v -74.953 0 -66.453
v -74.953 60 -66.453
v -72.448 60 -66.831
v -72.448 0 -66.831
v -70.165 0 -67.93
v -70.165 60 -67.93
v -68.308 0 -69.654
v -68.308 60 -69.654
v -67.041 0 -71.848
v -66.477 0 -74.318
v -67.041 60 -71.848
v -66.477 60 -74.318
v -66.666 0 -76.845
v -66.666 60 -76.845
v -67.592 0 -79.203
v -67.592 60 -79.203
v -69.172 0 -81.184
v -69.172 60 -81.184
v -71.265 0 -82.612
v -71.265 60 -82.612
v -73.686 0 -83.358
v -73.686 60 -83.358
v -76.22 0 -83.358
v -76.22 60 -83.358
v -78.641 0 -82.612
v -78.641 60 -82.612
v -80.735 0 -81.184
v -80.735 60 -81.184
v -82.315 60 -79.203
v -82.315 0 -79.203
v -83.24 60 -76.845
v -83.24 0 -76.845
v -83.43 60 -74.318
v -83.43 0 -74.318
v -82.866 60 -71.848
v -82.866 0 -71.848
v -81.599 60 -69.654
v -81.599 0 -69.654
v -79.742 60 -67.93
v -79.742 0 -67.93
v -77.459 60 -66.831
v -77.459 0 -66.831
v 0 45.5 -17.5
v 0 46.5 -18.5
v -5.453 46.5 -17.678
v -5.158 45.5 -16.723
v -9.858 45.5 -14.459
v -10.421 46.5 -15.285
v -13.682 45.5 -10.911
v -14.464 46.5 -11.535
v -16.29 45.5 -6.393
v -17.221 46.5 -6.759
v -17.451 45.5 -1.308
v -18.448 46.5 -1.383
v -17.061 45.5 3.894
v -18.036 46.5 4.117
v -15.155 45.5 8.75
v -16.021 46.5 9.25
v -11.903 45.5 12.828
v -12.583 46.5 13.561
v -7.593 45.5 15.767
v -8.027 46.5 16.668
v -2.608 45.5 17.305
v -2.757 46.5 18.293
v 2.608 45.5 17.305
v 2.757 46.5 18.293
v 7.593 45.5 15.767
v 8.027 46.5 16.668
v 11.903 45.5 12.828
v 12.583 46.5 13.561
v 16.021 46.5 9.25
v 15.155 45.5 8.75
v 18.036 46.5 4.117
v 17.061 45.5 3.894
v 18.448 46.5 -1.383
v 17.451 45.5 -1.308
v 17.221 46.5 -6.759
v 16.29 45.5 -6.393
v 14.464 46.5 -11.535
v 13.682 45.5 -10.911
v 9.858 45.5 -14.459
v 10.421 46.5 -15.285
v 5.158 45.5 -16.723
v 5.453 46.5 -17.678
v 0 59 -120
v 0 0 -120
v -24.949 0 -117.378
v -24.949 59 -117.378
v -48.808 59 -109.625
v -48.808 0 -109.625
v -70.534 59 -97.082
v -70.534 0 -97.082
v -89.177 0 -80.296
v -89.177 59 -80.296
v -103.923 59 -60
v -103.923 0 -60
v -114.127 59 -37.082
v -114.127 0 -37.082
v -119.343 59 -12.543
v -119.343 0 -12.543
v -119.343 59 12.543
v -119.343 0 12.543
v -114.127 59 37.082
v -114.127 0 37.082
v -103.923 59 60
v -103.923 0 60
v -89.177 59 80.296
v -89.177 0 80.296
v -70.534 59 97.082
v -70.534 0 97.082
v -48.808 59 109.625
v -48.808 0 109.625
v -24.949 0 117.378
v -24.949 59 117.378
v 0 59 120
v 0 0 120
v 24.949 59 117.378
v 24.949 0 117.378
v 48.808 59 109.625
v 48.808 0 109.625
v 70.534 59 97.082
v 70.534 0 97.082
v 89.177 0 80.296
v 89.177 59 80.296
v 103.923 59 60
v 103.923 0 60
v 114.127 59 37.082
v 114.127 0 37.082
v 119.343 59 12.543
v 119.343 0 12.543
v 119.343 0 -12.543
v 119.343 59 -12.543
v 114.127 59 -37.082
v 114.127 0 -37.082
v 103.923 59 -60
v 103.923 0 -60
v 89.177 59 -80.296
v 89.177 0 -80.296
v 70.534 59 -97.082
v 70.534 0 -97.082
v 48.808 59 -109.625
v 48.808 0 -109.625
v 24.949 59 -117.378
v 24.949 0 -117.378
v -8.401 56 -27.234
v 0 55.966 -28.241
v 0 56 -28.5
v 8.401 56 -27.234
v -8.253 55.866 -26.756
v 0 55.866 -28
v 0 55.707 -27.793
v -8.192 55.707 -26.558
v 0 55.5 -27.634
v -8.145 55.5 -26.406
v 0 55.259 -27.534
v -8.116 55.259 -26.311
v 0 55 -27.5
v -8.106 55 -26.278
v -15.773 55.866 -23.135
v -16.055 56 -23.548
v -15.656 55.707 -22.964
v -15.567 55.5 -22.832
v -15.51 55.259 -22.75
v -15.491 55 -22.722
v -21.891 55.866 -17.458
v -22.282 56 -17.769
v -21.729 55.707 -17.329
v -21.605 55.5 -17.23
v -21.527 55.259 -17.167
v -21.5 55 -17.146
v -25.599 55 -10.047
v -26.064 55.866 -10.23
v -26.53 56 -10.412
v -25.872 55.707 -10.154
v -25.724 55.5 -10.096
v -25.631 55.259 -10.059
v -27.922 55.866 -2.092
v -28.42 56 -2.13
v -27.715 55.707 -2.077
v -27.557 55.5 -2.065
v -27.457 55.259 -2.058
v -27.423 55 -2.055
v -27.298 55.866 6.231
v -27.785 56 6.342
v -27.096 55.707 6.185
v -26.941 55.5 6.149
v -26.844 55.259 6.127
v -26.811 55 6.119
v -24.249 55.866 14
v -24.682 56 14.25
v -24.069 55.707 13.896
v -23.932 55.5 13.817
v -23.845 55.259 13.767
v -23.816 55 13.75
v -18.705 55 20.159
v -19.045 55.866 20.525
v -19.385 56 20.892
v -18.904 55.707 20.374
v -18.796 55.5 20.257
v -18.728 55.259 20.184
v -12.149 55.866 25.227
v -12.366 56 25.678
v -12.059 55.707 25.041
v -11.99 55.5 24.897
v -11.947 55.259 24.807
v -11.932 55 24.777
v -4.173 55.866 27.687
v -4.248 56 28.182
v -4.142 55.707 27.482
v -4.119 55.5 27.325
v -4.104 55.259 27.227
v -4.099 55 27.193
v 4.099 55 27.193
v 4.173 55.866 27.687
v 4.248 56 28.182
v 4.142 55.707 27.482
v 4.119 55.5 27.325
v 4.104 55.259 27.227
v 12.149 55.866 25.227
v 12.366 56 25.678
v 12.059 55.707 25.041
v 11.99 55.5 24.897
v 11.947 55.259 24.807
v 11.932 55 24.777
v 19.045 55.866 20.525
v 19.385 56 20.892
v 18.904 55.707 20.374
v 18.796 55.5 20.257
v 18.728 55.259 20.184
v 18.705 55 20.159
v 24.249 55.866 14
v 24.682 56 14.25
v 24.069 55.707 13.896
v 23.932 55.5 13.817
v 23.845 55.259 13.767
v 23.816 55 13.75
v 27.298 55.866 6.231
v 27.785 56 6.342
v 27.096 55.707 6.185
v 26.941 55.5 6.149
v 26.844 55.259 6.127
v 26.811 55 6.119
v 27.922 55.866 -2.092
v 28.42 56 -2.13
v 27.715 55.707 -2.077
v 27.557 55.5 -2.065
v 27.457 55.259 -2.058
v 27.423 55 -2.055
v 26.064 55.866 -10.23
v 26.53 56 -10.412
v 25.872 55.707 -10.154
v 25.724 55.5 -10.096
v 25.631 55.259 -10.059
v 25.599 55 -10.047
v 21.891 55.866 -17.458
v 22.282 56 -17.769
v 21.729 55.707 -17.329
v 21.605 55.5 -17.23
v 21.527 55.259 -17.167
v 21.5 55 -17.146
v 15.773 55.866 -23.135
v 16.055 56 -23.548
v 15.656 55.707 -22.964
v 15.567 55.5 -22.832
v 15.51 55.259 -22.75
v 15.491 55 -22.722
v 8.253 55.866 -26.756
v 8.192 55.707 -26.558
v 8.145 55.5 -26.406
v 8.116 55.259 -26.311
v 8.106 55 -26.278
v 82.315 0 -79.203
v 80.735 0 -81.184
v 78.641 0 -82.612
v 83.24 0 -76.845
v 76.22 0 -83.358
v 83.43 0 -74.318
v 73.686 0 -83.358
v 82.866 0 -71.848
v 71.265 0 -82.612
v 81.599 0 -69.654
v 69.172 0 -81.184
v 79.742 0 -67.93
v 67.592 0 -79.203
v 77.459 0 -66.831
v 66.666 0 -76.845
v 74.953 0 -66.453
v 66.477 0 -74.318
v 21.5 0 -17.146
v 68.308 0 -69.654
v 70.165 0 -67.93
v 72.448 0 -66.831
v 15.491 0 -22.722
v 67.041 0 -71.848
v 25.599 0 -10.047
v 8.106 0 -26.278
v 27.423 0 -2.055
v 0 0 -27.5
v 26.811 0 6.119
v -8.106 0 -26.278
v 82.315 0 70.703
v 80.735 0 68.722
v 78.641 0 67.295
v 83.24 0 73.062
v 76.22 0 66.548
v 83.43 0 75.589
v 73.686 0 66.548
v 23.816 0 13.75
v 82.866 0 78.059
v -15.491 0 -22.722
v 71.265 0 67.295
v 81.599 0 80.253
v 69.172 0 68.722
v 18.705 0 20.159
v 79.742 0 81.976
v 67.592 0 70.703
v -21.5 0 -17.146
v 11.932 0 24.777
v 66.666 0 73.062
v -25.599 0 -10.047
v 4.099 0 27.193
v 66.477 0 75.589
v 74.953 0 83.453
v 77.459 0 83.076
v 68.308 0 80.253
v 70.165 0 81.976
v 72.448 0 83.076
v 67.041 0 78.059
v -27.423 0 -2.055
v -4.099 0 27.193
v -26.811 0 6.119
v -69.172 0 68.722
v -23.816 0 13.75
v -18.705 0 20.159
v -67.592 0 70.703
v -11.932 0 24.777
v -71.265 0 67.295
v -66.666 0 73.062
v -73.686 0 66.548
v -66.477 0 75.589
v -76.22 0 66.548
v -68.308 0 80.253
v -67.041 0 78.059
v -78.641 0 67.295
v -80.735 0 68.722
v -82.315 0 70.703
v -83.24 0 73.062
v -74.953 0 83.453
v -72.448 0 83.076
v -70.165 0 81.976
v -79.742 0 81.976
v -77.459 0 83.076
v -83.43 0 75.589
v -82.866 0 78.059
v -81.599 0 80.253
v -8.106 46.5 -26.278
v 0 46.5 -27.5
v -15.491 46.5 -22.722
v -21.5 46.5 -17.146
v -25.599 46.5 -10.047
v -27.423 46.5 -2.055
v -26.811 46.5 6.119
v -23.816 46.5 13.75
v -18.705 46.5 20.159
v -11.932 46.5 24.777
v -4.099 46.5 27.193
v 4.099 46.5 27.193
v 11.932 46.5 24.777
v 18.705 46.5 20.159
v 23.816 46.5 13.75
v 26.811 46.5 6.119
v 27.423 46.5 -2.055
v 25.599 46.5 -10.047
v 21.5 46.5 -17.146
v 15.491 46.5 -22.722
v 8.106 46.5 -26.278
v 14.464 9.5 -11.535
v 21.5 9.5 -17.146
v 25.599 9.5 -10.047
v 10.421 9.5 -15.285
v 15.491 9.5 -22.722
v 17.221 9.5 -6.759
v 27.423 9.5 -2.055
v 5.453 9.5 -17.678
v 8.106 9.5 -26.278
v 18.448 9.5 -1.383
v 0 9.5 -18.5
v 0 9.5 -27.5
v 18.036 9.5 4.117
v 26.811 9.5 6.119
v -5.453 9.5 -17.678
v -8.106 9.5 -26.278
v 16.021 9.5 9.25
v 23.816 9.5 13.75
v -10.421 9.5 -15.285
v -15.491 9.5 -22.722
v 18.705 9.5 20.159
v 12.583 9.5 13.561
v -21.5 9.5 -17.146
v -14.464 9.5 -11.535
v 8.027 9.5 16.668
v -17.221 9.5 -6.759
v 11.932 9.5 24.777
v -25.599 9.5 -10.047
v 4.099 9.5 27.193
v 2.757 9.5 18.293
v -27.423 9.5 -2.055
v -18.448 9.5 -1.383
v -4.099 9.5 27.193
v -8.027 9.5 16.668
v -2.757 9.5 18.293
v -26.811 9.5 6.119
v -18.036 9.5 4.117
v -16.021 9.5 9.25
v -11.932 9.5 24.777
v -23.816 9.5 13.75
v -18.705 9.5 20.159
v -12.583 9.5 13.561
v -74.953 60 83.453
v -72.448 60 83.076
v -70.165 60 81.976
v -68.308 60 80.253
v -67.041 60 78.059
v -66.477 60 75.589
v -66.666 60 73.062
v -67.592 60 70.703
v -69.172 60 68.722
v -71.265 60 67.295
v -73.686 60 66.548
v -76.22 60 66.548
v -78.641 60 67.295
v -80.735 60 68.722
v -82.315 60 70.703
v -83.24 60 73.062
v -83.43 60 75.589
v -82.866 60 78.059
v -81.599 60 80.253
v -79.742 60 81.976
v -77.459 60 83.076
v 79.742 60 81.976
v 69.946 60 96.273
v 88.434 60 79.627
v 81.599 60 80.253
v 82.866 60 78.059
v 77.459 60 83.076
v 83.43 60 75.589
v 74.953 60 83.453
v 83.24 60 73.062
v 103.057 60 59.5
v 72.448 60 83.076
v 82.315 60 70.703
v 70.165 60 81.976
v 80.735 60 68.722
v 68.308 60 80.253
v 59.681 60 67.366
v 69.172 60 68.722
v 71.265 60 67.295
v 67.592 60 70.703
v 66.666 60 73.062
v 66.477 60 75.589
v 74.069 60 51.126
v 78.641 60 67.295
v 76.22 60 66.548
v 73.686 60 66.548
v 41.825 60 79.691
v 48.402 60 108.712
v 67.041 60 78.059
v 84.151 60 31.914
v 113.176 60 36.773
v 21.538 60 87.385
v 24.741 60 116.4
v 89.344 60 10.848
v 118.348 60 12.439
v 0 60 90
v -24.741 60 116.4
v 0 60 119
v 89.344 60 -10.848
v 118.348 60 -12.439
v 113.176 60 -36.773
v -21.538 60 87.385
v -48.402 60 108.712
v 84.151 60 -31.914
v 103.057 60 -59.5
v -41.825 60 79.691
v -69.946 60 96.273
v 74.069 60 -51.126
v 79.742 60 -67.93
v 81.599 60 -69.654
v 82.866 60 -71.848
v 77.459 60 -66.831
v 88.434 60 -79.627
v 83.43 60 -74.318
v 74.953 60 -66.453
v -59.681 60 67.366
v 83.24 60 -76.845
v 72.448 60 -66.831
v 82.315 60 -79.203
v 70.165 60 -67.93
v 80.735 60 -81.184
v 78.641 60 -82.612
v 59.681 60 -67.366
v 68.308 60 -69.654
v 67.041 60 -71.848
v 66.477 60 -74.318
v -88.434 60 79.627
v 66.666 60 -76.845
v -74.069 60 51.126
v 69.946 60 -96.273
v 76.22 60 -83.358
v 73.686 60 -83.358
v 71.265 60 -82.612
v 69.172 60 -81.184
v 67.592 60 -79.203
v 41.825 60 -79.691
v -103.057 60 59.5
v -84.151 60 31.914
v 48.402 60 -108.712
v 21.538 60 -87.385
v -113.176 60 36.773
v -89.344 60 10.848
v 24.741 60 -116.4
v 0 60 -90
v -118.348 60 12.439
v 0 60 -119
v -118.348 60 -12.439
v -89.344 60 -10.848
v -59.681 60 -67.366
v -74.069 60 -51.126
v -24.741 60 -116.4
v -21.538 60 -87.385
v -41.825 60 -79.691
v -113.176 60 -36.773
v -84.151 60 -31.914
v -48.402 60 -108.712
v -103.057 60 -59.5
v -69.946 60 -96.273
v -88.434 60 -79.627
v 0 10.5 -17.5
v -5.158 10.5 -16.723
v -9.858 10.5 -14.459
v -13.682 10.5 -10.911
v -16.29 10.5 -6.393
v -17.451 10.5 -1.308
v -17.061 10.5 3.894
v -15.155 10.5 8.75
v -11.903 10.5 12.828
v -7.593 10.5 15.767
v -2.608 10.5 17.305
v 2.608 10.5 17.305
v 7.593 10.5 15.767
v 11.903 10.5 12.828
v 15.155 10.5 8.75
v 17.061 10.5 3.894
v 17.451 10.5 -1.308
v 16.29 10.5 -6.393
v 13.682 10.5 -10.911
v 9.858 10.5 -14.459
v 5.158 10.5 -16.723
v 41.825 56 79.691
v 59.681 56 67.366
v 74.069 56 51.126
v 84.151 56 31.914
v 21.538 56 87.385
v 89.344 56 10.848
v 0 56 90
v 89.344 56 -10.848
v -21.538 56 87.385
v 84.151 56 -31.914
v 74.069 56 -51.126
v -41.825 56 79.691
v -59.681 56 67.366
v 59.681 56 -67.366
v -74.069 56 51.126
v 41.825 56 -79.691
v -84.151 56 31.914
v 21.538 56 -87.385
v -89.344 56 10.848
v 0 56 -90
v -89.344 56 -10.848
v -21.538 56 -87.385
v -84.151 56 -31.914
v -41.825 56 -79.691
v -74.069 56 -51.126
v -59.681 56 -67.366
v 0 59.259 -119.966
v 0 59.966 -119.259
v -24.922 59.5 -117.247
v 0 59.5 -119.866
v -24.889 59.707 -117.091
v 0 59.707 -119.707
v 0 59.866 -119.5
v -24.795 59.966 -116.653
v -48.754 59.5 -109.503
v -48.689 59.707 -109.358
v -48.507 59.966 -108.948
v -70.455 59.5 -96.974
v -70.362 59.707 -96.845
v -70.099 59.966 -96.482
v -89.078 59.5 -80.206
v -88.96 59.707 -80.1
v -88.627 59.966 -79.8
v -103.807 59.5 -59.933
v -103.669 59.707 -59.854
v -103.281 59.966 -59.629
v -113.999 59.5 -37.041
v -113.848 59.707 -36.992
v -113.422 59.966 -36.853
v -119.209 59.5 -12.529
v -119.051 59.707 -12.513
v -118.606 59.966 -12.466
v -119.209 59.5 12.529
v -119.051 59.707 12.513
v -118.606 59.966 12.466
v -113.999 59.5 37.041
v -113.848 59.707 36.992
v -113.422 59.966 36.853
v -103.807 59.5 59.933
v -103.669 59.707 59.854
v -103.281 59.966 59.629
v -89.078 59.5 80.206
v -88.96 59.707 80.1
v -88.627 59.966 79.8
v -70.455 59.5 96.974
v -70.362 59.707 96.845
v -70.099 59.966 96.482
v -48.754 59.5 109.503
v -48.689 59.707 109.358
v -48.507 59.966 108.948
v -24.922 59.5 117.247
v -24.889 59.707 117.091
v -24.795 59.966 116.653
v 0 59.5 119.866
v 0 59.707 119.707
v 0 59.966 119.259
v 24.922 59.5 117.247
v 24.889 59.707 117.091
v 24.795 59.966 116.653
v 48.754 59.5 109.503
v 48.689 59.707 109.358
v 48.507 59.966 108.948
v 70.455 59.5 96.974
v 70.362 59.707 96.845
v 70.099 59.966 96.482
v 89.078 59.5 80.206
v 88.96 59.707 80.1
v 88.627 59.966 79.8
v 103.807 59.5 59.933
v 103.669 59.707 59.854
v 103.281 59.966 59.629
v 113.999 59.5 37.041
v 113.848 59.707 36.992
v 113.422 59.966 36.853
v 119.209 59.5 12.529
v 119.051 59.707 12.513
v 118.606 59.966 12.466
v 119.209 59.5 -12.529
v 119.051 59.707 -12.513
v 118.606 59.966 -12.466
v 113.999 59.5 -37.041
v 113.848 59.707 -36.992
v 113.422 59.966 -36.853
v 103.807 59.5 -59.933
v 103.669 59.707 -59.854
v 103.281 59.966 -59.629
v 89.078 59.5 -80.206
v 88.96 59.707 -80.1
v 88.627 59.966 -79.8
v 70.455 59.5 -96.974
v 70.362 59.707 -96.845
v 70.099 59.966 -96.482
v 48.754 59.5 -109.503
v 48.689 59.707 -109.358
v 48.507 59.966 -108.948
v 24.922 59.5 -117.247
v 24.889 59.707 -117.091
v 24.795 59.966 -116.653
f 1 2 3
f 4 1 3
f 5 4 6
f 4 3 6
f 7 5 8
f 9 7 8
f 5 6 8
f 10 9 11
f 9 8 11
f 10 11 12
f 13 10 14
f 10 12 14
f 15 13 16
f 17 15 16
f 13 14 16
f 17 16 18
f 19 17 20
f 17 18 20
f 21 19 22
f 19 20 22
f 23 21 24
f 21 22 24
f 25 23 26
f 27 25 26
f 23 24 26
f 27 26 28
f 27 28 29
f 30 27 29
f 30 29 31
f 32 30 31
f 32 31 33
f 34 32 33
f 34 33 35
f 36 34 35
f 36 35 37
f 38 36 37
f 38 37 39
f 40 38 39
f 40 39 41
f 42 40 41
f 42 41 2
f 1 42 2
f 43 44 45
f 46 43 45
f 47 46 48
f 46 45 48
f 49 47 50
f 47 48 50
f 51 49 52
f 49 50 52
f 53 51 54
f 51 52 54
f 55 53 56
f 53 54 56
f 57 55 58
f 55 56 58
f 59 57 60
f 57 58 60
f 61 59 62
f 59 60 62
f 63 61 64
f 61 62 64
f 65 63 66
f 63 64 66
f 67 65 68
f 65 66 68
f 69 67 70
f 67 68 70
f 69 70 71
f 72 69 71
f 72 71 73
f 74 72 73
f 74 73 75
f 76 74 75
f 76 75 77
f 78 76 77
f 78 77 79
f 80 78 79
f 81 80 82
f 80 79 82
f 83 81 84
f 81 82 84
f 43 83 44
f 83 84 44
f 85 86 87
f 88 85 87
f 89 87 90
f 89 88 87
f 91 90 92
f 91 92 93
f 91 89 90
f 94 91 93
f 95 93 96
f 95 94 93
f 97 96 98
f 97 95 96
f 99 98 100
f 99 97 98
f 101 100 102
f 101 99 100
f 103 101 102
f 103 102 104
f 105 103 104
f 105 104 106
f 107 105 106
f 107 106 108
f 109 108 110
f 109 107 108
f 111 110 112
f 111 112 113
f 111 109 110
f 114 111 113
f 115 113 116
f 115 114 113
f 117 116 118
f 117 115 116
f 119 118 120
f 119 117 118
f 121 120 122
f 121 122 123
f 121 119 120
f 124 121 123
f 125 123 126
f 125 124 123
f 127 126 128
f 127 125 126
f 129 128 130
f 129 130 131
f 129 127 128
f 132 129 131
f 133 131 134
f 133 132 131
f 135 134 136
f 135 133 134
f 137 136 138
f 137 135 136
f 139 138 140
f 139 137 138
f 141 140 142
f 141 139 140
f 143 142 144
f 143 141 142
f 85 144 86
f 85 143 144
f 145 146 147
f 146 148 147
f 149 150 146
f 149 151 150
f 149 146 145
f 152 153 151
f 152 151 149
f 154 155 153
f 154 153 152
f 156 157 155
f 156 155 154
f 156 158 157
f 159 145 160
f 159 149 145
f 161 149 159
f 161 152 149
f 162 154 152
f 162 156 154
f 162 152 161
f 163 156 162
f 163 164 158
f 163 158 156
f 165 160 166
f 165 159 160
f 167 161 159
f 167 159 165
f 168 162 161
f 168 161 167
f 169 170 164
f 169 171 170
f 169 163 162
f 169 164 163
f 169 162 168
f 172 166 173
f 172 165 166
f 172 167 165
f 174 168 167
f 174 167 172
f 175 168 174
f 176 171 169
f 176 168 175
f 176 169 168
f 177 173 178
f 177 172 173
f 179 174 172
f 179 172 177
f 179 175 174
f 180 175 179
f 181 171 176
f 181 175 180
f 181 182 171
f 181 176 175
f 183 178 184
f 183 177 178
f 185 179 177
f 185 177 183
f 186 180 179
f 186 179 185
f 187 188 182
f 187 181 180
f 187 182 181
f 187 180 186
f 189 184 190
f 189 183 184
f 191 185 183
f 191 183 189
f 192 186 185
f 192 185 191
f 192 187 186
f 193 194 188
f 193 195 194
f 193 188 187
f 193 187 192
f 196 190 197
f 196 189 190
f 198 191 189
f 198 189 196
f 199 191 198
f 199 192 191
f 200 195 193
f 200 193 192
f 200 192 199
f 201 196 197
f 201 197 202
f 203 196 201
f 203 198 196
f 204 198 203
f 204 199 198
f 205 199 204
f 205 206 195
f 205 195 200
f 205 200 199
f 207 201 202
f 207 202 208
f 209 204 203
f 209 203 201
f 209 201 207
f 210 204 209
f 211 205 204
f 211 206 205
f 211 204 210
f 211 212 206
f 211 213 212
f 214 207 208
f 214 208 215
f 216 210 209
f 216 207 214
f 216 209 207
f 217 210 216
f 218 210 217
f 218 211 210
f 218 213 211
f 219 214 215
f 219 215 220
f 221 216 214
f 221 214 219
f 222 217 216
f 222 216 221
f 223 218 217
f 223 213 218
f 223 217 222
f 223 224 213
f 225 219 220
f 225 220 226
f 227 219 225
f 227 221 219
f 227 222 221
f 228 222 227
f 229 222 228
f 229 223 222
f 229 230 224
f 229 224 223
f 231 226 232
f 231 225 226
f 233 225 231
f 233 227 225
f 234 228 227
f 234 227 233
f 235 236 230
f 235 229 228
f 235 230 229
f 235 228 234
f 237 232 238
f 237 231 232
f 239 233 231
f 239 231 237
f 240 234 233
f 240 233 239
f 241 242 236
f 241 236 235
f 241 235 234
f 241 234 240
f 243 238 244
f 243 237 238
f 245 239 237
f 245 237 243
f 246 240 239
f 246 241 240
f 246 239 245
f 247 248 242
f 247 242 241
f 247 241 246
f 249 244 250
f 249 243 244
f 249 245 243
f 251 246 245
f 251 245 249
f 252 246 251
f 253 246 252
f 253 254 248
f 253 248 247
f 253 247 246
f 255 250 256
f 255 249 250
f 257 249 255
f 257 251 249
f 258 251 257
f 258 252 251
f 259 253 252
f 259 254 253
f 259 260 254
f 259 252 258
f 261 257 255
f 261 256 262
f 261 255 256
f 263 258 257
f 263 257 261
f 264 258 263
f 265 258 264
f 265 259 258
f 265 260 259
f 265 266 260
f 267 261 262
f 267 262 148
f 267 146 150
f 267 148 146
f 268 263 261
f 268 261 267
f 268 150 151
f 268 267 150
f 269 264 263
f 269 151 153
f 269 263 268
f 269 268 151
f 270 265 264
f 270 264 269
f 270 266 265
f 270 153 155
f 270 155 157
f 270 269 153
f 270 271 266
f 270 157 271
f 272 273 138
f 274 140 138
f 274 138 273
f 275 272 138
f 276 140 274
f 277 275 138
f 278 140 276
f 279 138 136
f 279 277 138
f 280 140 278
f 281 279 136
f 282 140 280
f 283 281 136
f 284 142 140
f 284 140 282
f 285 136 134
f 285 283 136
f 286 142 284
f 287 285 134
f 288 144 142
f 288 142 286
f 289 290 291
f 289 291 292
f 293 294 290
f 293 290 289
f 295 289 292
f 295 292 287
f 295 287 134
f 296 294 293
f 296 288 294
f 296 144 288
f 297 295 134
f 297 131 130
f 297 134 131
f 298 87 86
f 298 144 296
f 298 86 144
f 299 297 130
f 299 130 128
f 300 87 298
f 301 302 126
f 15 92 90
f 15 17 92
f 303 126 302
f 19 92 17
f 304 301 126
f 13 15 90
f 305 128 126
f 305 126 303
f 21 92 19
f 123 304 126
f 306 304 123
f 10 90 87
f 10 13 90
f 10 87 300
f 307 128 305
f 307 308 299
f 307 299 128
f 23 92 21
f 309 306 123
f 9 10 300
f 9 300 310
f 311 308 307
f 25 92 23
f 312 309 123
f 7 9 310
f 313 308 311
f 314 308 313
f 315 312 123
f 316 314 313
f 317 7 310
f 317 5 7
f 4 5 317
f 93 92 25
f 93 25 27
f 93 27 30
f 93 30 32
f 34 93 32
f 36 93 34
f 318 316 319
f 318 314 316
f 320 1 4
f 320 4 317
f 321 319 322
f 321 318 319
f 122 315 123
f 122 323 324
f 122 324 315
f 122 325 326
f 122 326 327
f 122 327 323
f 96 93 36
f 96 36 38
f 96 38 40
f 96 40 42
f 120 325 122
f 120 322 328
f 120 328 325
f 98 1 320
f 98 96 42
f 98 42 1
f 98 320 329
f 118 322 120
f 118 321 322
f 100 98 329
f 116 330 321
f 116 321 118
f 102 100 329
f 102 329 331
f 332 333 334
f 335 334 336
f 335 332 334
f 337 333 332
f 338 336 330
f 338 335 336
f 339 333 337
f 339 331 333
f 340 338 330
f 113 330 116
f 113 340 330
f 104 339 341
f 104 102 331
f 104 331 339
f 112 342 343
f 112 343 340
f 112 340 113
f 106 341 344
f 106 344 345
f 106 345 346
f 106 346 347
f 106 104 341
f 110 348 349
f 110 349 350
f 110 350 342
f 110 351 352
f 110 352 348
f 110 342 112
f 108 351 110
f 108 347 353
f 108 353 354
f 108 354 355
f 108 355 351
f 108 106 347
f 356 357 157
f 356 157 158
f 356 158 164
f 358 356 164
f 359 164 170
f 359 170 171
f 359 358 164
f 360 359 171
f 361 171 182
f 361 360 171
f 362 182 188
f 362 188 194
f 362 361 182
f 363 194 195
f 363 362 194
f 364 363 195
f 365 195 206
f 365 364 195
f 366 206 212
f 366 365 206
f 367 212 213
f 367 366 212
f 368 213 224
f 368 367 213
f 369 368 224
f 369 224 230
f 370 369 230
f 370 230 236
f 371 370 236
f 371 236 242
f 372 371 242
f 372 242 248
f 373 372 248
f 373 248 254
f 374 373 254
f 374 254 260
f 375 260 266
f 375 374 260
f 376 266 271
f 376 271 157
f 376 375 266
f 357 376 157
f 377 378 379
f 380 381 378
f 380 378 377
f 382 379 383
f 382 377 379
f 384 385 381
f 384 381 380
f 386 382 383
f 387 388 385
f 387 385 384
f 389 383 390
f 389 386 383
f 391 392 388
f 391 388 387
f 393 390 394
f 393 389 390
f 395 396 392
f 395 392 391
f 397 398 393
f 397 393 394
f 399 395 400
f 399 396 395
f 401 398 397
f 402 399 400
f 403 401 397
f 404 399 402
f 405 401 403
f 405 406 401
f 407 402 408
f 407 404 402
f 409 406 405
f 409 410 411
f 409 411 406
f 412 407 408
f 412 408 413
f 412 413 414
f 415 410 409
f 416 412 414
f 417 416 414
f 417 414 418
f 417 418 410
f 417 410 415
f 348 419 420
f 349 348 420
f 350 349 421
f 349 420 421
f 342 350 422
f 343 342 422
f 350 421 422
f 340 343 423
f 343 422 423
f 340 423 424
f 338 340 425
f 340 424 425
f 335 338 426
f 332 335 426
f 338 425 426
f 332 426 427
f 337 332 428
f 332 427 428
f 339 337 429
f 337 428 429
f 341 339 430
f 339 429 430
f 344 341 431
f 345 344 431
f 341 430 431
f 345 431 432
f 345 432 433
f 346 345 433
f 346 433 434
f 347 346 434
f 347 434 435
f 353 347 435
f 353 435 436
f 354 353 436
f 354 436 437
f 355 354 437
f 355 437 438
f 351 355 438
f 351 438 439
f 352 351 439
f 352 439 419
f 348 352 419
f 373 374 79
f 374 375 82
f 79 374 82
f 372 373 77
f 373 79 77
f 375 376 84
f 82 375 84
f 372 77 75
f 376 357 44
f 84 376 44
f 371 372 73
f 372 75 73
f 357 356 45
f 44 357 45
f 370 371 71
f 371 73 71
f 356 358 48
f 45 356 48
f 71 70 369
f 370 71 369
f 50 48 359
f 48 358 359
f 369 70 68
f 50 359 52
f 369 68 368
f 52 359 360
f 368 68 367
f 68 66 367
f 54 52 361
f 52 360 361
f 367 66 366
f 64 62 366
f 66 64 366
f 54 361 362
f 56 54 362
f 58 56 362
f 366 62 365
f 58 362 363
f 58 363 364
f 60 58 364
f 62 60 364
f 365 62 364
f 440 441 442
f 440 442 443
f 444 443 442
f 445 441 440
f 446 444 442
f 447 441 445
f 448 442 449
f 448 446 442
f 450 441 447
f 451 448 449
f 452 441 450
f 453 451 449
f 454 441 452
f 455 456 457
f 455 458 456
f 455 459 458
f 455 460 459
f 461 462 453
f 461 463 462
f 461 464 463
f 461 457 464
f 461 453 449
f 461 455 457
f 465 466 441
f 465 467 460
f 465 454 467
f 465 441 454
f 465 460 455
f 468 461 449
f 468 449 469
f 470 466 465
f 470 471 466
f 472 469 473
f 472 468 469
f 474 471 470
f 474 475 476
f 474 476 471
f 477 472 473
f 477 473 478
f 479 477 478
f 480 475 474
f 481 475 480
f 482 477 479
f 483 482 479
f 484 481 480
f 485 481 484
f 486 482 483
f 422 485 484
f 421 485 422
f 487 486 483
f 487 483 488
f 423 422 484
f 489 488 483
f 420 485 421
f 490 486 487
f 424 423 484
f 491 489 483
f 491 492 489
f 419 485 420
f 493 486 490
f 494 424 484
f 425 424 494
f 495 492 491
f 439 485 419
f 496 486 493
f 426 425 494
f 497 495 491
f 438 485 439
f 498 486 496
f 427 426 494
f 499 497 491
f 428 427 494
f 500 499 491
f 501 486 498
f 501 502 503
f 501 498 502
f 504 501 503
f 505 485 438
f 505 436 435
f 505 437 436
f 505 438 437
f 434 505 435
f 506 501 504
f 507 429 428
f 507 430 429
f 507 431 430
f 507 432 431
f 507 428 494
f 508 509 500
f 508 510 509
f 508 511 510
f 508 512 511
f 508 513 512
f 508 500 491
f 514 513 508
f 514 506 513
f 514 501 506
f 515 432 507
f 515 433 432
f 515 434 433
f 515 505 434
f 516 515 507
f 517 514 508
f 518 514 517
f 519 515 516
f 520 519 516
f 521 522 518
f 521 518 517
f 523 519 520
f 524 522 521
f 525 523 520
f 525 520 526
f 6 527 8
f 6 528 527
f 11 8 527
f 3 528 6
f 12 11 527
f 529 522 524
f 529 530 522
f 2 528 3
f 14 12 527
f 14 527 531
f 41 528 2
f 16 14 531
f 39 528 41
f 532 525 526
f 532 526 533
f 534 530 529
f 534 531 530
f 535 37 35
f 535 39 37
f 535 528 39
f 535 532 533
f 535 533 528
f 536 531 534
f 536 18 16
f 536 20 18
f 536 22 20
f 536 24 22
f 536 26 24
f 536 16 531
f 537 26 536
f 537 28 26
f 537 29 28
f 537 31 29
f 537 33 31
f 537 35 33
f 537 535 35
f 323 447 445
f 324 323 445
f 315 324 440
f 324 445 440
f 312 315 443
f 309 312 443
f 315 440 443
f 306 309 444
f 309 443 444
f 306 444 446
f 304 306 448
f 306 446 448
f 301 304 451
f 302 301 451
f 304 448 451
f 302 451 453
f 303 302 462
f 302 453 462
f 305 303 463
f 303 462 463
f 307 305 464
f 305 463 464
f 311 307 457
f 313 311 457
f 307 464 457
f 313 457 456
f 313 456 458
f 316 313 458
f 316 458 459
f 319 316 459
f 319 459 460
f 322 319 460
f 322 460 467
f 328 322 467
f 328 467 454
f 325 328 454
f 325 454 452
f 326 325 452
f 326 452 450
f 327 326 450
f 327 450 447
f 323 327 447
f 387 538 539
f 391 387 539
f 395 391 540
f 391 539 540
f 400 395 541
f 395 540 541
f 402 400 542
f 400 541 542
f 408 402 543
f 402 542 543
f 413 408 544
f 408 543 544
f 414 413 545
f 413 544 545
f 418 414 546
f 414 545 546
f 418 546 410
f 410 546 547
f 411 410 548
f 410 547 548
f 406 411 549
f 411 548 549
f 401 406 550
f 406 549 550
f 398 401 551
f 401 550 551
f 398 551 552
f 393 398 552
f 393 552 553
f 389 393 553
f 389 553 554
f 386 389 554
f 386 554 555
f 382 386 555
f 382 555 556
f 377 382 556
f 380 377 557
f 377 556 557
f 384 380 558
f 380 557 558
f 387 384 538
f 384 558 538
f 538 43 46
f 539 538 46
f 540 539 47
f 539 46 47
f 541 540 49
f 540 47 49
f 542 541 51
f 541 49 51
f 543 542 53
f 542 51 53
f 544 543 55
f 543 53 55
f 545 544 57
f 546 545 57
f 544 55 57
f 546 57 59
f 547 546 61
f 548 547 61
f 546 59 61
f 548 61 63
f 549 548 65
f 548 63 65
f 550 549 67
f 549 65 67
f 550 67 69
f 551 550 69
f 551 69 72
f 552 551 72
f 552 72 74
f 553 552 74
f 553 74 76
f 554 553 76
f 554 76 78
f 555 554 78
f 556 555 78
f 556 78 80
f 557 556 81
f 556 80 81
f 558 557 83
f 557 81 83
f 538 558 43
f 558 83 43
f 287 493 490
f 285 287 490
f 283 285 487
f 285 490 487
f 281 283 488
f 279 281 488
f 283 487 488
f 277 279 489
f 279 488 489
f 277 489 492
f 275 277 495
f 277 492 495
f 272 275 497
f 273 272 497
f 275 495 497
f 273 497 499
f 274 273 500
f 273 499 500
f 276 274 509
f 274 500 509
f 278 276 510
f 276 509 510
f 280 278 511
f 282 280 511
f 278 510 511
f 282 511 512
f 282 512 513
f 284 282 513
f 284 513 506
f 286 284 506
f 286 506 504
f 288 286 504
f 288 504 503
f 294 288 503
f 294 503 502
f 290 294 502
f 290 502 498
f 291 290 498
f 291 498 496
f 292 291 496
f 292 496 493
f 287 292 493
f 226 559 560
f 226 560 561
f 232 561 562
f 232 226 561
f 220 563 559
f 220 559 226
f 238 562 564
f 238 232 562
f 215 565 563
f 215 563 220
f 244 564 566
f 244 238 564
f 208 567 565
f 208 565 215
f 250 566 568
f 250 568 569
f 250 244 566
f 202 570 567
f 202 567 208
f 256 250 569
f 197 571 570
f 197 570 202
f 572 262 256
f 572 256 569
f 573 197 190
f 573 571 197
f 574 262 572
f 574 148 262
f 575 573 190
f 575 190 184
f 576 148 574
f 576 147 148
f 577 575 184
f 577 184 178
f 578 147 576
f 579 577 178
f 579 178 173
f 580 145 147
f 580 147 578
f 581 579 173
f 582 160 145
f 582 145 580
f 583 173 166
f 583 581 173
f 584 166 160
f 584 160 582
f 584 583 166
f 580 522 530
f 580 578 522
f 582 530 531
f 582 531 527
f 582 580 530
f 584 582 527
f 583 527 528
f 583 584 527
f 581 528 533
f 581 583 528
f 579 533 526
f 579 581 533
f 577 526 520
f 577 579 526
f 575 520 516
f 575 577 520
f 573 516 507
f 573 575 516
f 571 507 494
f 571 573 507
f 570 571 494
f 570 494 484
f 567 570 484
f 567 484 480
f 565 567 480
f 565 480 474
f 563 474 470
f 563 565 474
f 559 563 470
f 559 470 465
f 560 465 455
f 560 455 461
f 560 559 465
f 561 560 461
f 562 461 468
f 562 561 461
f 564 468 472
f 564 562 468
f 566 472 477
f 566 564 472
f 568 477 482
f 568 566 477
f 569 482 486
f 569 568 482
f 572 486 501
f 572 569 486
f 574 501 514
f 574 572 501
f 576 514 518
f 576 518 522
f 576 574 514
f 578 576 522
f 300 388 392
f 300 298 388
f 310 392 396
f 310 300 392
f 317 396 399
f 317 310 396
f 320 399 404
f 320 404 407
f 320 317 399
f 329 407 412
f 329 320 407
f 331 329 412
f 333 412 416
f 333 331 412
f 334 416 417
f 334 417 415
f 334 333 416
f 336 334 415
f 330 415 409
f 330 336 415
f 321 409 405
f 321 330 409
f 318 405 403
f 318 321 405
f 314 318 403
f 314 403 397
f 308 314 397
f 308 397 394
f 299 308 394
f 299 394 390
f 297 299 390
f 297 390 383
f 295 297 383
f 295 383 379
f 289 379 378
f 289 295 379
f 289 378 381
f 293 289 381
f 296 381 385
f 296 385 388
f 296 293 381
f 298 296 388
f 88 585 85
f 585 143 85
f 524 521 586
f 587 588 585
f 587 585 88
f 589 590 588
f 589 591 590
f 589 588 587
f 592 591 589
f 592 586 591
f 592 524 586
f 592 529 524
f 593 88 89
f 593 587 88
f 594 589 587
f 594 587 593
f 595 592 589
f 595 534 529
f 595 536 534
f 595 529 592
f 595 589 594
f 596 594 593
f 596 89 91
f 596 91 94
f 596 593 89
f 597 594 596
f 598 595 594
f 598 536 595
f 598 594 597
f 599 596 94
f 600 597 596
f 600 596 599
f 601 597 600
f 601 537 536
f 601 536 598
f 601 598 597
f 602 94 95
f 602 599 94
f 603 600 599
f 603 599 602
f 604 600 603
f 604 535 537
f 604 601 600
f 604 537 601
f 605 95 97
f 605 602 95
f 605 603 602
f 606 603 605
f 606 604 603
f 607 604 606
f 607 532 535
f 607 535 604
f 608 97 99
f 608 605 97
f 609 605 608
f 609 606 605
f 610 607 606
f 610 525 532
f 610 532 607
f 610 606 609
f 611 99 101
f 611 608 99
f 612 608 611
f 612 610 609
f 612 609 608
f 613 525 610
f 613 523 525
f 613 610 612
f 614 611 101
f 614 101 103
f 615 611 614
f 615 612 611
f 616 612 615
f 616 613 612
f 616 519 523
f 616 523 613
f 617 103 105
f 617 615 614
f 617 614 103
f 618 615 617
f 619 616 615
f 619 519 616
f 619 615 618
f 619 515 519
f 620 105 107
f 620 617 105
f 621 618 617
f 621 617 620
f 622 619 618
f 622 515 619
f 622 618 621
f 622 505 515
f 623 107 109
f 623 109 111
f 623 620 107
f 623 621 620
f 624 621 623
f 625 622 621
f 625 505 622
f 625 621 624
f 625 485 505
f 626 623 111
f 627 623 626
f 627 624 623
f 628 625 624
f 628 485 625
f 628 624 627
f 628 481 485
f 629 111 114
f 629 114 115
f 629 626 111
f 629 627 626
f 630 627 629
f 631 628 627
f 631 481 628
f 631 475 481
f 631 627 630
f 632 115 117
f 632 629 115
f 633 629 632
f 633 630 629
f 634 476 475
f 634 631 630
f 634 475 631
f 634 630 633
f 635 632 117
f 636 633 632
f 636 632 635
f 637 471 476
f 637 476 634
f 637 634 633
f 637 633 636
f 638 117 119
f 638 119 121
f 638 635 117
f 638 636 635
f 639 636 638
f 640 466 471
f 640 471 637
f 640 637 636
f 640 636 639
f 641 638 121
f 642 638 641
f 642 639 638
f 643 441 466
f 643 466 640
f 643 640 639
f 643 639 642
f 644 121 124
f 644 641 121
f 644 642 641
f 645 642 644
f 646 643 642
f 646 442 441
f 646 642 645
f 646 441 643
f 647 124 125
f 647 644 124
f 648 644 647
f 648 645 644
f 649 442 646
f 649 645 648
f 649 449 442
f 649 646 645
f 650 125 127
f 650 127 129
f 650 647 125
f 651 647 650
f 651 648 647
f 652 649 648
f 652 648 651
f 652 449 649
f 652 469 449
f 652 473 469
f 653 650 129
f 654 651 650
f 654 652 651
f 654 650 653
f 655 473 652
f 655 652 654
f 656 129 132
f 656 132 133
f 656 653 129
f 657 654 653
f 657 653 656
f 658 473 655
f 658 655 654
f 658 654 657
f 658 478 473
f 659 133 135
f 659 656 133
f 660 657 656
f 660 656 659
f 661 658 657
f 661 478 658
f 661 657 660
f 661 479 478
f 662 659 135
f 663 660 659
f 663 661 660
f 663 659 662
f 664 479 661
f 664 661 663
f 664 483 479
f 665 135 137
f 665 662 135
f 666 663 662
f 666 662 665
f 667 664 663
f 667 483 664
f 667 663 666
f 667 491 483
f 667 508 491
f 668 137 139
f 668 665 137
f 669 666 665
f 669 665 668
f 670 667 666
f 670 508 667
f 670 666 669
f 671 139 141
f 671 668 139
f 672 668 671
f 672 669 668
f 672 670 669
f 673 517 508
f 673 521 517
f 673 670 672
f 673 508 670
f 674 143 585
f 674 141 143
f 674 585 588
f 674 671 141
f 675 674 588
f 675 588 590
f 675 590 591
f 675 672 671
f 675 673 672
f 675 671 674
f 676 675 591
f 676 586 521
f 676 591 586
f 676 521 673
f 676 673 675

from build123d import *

# Parameters (mm, degrees)
SKETCH2_R          = 8.5
CUT_EXTRUDE1_DEPTH = 181
FILLET1_R          = 1
CHAMFER1_SIZE      = 1


with BuildPart() as part:
    # Sketch1 → Revolve1 (revolve)
    with BuildSketch(Plane.XY):
        Polygon((27.5, 9.5), (27.5, 0), (120, 0), (120, 60), (90, 60), (90, 56), (27.5, 56), (27.5, 46.5), (17.5, 46.5), (17.5, 9.5), align=None)
    revolve(axis=Axis((0, 0, 0), (0, 1, 0)))

    # Sketch2 → Cut-Extrude1 (cut, through all)
    with BuildSketch(Plane(origin=(0, 60, 0), x_dir=(1, 0, 0), z_dir=(0, 1, 0))):
        with Locations((-74.953318805, 74.953318805)):
            Circle(SKETCH2_R)
        with Locations((74.953318805, 74.953318805)):
            Circle(SKETCH2_R)
        with Locations((74.953318805, -74.953318805)):
            Circle(SKETCH2_R)
        with Locations((-74.953318805, -74.953318805)):
            Circle(SKETCH2_R)
    extrude(amount=-CUT_EXTRUDE1_DEPTH, mode=Mode.SUBTRACT)

    # Fillet1
    fillet1_edges = [part.edges().sort_by_distance(p)[0] for p in [
        (-27.5, 56, 0),
        (-120, 60, 0),
    ]]
    fillet(fillet1_edges, radius=FILLET1_R)

    # Chamfer1
    chamfer1_edges = [part.edges().sort_by_distance(p)[0] for p in [
        (-17.5, 9.5, 0),
        (-17.5, 46.5, 0),
    ]]
    chamfer(chamfer1_edges, length=CHAMFER1_SIZE)


solid = part.part
